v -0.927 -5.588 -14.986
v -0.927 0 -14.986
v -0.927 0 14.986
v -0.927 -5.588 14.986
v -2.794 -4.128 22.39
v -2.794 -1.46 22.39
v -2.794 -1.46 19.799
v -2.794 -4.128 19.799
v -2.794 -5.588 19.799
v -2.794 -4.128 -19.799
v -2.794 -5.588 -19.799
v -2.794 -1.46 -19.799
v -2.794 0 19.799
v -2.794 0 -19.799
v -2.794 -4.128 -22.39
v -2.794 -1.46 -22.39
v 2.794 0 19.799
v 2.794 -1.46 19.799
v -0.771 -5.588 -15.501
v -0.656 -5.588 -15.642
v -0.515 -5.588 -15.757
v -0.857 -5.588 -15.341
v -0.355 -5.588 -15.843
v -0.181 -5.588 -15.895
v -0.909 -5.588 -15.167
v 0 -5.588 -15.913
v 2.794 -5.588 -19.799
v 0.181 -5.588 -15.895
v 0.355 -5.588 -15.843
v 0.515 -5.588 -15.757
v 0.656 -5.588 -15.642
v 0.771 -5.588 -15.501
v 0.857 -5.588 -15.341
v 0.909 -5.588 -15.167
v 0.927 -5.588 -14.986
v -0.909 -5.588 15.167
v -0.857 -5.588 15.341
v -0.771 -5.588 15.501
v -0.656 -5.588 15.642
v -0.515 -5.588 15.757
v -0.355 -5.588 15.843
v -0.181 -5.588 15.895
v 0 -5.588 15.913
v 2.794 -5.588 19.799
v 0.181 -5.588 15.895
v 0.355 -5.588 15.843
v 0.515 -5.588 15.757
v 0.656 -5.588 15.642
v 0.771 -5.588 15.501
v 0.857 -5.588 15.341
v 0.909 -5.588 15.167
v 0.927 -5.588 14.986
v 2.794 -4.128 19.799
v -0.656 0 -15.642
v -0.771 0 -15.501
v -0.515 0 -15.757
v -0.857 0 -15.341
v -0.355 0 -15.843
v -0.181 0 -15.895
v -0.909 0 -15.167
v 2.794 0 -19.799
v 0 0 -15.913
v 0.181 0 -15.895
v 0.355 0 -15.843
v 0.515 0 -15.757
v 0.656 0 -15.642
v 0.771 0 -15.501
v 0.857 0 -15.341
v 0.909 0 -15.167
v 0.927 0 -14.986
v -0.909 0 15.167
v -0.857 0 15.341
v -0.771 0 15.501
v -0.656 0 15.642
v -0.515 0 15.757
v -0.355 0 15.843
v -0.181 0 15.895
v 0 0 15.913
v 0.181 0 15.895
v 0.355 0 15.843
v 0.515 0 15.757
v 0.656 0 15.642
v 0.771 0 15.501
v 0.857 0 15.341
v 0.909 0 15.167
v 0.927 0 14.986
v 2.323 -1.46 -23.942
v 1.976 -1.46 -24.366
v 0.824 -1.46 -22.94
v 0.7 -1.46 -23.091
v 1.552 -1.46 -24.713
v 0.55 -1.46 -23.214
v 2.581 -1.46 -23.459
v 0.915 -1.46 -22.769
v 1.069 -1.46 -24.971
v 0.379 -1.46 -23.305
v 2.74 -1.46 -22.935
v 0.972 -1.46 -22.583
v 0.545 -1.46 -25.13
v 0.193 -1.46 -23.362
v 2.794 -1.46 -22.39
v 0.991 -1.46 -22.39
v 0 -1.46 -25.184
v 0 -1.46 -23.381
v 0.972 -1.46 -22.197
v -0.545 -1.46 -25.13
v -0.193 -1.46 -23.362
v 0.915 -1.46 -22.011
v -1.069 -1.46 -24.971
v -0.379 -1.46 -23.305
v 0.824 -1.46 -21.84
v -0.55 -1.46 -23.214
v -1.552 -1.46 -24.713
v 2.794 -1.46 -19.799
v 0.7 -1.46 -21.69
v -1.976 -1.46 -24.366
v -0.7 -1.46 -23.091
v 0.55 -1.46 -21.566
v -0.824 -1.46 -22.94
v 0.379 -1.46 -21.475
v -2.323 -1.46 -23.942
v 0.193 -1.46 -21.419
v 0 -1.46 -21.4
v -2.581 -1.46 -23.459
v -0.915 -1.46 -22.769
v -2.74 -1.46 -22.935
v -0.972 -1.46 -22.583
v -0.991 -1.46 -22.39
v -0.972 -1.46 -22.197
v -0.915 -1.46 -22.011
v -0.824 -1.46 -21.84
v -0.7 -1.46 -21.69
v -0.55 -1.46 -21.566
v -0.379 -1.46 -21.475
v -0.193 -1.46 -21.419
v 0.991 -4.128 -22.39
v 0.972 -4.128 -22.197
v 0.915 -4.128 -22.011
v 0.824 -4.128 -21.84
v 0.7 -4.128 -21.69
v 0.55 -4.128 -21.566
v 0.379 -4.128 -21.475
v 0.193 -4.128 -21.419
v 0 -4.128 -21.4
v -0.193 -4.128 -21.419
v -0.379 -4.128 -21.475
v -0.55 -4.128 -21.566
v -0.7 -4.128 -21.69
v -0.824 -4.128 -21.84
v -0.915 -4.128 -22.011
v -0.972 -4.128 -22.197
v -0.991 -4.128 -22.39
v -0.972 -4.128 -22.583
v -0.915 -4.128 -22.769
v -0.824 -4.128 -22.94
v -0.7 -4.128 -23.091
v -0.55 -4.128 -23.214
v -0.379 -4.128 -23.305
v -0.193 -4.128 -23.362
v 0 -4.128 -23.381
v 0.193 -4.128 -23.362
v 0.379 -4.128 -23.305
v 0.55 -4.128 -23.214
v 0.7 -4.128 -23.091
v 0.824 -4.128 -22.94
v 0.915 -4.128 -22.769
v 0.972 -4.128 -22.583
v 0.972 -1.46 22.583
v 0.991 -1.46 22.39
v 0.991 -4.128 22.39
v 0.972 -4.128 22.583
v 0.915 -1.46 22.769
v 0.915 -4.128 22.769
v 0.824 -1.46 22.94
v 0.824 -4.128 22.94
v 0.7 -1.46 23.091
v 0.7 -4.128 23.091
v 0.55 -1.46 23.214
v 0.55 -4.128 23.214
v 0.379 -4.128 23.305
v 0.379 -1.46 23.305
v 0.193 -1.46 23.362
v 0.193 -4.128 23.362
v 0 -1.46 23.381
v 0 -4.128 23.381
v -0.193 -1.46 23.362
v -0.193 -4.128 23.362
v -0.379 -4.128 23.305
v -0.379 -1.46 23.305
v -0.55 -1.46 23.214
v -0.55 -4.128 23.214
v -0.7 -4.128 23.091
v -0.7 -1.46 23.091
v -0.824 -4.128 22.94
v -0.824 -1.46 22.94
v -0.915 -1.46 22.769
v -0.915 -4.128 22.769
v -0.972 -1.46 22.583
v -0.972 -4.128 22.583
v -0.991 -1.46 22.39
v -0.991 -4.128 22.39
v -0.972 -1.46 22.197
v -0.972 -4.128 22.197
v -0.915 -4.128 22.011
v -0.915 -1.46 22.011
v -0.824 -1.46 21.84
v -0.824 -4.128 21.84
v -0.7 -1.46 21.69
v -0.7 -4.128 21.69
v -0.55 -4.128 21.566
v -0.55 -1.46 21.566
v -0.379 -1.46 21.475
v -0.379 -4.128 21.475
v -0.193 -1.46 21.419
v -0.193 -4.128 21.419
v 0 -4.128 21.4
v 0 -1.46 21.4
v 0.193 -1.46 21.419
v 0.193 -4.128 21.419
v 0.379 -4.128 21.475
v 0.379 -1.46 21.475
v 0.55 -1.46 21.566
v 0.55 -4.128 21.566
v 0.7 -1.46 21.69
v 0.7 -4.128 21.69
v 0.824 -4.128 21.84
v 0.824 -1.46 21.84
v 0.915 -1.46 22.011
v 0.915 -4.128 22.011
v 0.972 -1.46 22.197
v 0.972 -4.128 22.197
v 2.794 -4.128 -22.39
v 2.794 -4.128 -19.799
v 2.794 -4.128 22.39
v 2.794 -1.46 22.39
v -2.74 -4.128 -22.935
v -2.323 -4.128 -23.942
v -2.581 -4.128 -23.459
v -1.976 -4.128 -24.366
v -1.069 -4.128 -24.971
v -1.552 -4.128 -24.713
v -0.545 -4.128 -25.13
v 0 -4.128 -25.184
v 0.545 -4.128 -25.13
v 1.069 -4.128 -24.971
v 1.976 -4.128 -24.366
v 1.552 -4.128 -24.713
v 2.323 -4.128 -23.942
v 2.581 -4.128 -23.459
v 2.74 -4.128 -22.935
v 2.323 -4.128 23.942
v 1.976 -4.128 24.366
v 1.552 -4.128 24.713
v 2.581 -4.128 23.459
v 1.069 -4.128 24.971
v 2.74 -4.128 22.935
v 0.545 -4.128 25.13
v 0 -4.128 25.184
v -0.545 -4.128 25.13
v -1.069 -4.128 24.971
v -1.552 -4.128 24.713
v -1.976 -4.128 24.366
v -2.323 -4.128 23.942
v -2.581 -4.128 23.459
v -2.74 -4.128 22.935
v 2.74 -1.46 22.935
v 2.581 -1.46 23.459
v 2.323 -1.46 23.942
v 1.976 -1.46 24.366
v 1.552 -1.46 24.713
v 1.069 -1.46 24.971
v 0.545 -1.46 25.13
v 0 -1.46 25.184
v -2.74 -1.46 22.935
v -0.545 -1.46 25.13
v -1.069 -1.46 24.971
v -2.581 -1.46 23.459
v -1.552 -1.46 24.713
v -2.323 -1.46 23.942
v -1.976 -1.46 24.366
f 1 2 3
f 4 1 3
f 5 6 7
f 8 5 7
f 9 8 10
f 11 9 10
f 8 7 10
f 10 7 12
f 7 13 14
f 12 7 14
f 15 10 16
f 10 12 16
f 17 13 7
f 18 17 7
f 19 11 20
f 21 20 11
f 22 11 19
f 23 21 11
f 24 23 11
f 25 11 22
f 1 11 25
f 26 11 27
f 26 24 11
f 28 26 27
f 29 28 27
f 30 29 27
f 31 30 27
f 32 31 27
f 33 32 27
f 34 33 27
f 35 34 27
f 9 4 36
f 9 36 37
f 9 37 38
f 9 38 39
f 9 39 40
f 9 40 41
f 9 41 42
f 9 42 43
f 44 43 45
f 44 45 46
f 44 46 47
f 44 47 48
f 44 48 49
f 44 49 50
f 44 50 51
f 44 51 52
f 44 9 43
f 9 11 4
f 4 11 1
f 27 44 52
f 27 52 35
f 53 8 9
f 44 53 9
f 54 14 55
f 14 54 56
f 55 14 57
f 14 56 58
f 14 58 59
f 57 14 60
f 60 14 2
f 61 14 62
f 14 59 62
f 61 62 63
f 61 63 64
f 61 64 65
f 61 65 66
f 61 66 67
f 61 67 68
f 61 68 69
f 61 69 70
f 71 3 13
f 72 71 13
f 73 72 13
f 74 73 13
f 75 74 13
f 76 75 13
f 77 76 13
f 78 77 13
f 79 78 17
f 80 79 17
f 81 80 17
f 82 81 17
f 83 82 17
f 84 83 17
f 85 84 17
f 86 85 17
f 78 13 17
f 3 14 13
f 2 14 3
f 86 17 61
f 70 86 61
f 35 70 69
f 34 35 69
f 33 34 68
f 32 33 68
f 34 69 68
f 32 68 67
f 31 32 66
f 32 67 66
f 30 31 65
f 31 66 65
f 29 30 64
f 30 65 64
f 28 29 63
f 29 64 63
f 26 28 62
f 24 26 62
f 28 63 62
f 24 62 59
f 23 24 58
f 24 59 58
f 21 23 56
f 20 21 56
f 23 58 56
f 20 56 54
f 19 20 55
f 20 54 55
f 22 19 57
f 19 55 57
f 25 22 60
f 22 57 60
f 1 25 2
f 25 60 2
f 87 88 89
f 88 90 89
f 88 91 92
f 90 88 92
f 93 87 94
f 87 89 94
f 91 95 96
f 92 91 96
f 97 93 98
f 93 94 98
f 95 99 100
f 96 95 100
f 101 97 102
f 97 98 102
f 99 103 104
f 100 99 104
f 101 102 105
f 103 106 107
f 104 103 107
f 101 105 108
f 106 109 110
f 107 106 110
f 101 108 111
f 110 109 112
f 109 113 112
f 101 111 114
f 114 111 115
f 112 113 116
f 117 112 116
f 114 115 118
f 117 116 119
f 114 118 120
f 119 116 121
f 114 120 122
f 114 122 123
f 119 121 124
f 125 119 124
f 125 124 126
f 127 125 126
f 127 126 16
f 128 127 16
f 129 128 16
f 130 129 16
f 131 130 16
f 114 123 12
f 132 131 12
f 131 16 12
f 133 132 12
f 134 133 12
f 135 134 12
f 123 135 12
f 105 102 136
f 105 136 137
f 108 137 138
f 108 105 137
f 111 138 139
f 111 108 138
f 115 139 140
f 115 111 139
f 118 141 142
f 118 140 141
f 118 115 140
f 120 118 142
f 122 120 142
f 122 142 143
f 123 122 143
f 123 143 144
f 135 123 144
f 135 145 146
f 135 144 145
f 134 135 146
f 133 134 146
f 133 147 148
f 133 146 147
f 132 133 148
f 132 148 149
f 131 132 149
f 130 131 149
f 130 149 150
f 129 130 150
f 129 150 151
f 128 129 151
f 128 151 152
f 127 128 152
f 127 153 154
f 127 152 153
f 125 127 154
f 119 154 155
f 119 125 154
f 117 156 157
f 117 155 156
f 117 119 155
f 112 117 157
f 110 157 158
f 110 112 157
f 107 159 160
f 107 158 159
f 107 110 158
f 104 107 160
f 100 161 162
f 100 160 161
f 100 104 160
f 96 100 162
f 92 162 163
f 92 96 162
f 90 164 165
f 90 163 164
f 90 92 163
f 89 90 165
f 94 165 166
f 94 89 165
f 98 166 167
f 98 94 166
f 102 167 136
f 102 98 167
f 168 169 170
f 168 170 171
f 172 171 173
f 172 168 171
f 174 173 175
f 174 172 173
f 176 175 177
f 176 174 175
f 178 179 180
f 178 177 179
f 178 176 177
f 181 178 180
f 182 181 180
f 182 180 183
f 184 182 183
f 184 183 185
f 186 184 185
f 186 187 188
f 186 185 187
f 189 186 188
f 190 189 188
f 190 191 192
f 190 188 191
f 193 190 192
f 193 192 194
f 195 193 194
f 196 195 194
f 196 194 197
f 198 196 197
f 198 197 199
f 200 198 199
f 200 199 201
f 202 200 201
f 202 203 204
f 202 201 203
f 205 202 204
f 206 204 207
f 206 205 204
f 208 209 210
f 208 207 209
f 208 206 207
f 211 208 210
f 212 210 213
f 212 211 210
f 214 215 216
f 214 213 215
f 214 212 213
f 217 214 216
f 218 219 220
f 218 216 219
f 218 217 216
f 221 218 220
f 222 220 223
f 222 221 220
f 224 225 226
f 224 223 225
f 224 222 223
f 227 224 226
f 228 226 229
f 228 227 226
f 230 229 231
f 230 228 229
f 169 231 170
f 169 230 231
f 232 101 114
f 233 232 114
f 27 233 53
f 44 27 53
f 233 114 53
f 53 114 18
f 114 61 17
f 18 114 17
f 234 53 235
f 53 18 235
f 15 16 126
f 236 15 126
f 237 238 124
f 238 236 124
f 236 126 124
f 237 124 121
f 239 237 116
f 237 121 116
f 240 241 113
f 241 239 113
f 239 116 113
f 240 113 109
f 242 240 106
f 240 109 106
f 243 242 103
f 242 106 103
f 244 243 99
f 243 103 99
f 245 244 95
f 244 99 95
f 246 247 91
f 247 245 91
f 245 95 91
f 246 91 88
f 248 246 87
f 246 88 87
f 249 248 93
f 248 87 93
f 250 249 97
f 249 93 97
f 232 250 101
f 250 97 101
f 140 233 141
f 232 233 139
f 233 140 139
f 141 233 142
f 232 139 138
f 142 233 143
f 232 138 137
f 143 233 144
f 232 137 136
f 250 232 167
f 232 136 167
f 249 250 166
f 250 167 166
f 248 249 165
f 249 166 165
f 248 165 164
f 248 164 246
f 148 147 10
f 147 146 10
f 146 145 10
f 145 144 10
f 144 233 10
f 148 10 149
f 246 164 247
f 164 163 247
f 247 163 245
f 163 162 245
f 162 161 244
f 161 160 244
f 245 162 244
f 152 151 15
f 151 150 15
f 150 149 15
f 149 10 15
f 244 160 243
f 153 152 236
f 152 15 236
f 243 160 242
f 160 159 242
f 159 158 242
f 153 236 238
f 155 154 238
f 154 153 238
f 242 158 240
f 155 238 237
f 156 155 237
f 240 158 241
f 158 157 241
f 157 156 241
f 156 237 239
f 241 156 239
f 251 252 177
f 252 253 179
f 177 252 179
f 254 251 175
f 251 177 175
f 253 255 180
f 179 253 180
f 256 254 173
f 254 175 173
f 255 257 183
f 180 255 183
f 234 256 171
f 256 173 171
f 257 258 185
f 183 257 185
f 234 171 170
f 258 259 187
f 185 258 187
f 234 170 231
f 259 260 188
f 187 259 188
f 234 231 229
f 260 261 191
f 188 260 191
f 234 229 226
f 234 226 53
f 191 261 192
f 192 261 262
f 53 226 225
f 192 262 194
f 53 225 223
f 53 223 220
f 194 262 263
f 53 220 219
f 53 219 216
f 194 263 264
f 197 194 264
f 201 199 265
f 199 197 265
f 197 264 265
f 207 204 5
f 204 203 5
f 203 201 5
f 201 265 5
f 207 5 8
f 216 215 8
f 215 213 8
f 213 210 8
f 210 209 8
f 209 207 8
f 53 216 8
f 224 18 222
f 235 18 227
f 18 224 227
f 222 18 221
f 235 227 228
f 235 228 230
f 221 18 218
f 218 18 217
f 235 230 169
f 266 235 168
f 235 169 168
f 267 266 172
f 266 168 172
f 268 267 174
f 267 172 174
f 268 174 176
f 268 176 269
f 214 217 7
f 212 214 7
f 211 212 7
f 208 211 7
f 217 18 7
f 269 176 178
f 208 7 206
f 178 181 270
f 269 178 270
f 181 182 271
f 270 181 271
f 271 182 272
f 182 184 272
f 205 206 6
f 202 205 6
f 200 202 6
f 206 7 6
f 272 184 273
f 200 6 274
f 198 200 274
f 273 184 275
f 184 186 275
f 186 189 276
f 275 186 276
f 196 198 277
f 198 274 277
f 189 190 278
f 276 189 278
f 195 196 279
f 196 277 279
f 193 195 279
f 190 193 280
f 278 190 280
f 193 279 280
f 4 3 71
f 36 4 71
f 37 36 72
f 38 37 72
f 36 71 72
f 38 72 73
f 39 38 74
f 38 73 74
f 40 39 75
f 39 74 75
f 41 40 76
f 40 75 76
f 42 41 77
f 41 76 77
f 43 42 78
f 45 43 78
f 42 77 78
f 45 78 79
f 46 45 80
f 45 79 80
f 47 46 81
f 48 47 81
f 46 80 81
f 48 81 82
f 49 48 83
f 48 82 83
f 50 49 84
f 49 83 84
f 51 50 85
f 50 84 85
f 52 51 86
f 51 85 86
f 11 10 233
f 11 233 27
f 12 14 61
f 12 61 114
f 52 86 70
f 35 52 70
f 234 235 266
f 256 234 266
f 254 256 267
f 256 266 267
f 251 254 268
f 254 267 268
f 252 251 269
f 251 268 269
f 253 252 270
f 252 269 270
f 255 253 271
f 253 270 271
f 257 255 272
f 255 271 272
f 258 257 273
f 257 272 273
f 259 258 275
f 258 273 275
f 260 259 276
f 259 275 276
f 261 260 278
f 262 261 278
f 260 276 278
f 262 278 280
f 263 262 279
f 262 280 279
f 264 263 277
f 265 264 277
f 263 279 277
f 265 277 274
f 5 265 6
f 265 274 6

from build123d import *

# Parameters (mm, degrees)
F0_W     = 5.588
F0_H     = 33.6042
F0_R     = 0.9906
F1_DEPTH = 5.588
F2_W     = 1.4605
F2_H     = 2.5908
F2_H_2   = 2.794
F3_DEPTH = 5.589


with BuildPart() as f1:
    # F0 (on Front) → F1 (new body)
    with BuildSketch(Plane.XZ):
        Rectangle(F0_W, F0_H)
        with BuildLine():
            ThreePointArc((-0.9271, 14.986), (0, 15.9131), (0.9271, 14.986))
            Line((0.9271, 14.986), (0.9271, -14.986))
            ThreePointArc((0.9271, -14.986), (0, -15.9131), (-0.9271, -14.986))
            Line((-0.9271, -14.986), (-0.9271, 14.986))
        make_face(mode=Mode.SUBTRACT)
        with BuildLine():
            Line((-2.794, 16.8021), (2.794, 16.8021))
            Line((2.794, 16.8021), (2.794, 22.3901))
            ThreePointArc((2.794, 22.3901), (0, 25.1841), (-2.794, 22.3901))
            Line((-2.794, 22.3901), (-2.794, 16.8021))
        make_face()
        with Locations((0, 22.3901)):
            Circle(F0_R, mode=Mode.SUBTRACT)
        with BuildLine():
            Line((2.794, -22.3901), (2.794, -16.8021))
            Line((2.794, -16.8021), (-2.794, -16.8021))
            Line((-2.794, -16.8021), (-2.794, -22.3901))
            ThreePointArc((-2.794, -22.3901), (0, -25.1841), (2.794, -22.3901))
        make_face()
        with Locations((0, -22.3901)):
            Circle(F0_R, mode=Mode.SUBTRACT)
    extrude(amount=F1_DEPTH)

    # F2 (on face) → F3 (cut, through all)
    with BuildSketch(Plane(origin=(-2.794, 0, 0), x_dir=(0, -1, 0), z_dir=(-1, 0, 0))):
        with Locations((0.73025, 21.0947)):
            Rectangle(F2_W, F2_H)
        with Locations((0.73025, 23.7871)):
            Rectangle(F2_W, F2_H_2)
        with Locations((4.85775, 23.7871)):
            Rectangle(F2_W, F2_H_2)
        with Locations((4.85775, 21.0947)):
            Rectangle(F2_W, F2_H)
        with Locations((0.73025, -23.7871)):
            Rectangle(F2_W, F2_H_2)
        with Locations((0.73025, -21.0947)):
            Rectangle(F2_W, F2_H)
        with Locations((4.85775, -21.0947)):
            Rectangle(F2_W, F2_H)
        with Locations((4.85775, -23.7871)):
            Rectangle(F2_W, F2_H_2)
    extrude(amount=-F3_DEPTH, mode=Mode.SUBTRACT)


solid = f1.part
